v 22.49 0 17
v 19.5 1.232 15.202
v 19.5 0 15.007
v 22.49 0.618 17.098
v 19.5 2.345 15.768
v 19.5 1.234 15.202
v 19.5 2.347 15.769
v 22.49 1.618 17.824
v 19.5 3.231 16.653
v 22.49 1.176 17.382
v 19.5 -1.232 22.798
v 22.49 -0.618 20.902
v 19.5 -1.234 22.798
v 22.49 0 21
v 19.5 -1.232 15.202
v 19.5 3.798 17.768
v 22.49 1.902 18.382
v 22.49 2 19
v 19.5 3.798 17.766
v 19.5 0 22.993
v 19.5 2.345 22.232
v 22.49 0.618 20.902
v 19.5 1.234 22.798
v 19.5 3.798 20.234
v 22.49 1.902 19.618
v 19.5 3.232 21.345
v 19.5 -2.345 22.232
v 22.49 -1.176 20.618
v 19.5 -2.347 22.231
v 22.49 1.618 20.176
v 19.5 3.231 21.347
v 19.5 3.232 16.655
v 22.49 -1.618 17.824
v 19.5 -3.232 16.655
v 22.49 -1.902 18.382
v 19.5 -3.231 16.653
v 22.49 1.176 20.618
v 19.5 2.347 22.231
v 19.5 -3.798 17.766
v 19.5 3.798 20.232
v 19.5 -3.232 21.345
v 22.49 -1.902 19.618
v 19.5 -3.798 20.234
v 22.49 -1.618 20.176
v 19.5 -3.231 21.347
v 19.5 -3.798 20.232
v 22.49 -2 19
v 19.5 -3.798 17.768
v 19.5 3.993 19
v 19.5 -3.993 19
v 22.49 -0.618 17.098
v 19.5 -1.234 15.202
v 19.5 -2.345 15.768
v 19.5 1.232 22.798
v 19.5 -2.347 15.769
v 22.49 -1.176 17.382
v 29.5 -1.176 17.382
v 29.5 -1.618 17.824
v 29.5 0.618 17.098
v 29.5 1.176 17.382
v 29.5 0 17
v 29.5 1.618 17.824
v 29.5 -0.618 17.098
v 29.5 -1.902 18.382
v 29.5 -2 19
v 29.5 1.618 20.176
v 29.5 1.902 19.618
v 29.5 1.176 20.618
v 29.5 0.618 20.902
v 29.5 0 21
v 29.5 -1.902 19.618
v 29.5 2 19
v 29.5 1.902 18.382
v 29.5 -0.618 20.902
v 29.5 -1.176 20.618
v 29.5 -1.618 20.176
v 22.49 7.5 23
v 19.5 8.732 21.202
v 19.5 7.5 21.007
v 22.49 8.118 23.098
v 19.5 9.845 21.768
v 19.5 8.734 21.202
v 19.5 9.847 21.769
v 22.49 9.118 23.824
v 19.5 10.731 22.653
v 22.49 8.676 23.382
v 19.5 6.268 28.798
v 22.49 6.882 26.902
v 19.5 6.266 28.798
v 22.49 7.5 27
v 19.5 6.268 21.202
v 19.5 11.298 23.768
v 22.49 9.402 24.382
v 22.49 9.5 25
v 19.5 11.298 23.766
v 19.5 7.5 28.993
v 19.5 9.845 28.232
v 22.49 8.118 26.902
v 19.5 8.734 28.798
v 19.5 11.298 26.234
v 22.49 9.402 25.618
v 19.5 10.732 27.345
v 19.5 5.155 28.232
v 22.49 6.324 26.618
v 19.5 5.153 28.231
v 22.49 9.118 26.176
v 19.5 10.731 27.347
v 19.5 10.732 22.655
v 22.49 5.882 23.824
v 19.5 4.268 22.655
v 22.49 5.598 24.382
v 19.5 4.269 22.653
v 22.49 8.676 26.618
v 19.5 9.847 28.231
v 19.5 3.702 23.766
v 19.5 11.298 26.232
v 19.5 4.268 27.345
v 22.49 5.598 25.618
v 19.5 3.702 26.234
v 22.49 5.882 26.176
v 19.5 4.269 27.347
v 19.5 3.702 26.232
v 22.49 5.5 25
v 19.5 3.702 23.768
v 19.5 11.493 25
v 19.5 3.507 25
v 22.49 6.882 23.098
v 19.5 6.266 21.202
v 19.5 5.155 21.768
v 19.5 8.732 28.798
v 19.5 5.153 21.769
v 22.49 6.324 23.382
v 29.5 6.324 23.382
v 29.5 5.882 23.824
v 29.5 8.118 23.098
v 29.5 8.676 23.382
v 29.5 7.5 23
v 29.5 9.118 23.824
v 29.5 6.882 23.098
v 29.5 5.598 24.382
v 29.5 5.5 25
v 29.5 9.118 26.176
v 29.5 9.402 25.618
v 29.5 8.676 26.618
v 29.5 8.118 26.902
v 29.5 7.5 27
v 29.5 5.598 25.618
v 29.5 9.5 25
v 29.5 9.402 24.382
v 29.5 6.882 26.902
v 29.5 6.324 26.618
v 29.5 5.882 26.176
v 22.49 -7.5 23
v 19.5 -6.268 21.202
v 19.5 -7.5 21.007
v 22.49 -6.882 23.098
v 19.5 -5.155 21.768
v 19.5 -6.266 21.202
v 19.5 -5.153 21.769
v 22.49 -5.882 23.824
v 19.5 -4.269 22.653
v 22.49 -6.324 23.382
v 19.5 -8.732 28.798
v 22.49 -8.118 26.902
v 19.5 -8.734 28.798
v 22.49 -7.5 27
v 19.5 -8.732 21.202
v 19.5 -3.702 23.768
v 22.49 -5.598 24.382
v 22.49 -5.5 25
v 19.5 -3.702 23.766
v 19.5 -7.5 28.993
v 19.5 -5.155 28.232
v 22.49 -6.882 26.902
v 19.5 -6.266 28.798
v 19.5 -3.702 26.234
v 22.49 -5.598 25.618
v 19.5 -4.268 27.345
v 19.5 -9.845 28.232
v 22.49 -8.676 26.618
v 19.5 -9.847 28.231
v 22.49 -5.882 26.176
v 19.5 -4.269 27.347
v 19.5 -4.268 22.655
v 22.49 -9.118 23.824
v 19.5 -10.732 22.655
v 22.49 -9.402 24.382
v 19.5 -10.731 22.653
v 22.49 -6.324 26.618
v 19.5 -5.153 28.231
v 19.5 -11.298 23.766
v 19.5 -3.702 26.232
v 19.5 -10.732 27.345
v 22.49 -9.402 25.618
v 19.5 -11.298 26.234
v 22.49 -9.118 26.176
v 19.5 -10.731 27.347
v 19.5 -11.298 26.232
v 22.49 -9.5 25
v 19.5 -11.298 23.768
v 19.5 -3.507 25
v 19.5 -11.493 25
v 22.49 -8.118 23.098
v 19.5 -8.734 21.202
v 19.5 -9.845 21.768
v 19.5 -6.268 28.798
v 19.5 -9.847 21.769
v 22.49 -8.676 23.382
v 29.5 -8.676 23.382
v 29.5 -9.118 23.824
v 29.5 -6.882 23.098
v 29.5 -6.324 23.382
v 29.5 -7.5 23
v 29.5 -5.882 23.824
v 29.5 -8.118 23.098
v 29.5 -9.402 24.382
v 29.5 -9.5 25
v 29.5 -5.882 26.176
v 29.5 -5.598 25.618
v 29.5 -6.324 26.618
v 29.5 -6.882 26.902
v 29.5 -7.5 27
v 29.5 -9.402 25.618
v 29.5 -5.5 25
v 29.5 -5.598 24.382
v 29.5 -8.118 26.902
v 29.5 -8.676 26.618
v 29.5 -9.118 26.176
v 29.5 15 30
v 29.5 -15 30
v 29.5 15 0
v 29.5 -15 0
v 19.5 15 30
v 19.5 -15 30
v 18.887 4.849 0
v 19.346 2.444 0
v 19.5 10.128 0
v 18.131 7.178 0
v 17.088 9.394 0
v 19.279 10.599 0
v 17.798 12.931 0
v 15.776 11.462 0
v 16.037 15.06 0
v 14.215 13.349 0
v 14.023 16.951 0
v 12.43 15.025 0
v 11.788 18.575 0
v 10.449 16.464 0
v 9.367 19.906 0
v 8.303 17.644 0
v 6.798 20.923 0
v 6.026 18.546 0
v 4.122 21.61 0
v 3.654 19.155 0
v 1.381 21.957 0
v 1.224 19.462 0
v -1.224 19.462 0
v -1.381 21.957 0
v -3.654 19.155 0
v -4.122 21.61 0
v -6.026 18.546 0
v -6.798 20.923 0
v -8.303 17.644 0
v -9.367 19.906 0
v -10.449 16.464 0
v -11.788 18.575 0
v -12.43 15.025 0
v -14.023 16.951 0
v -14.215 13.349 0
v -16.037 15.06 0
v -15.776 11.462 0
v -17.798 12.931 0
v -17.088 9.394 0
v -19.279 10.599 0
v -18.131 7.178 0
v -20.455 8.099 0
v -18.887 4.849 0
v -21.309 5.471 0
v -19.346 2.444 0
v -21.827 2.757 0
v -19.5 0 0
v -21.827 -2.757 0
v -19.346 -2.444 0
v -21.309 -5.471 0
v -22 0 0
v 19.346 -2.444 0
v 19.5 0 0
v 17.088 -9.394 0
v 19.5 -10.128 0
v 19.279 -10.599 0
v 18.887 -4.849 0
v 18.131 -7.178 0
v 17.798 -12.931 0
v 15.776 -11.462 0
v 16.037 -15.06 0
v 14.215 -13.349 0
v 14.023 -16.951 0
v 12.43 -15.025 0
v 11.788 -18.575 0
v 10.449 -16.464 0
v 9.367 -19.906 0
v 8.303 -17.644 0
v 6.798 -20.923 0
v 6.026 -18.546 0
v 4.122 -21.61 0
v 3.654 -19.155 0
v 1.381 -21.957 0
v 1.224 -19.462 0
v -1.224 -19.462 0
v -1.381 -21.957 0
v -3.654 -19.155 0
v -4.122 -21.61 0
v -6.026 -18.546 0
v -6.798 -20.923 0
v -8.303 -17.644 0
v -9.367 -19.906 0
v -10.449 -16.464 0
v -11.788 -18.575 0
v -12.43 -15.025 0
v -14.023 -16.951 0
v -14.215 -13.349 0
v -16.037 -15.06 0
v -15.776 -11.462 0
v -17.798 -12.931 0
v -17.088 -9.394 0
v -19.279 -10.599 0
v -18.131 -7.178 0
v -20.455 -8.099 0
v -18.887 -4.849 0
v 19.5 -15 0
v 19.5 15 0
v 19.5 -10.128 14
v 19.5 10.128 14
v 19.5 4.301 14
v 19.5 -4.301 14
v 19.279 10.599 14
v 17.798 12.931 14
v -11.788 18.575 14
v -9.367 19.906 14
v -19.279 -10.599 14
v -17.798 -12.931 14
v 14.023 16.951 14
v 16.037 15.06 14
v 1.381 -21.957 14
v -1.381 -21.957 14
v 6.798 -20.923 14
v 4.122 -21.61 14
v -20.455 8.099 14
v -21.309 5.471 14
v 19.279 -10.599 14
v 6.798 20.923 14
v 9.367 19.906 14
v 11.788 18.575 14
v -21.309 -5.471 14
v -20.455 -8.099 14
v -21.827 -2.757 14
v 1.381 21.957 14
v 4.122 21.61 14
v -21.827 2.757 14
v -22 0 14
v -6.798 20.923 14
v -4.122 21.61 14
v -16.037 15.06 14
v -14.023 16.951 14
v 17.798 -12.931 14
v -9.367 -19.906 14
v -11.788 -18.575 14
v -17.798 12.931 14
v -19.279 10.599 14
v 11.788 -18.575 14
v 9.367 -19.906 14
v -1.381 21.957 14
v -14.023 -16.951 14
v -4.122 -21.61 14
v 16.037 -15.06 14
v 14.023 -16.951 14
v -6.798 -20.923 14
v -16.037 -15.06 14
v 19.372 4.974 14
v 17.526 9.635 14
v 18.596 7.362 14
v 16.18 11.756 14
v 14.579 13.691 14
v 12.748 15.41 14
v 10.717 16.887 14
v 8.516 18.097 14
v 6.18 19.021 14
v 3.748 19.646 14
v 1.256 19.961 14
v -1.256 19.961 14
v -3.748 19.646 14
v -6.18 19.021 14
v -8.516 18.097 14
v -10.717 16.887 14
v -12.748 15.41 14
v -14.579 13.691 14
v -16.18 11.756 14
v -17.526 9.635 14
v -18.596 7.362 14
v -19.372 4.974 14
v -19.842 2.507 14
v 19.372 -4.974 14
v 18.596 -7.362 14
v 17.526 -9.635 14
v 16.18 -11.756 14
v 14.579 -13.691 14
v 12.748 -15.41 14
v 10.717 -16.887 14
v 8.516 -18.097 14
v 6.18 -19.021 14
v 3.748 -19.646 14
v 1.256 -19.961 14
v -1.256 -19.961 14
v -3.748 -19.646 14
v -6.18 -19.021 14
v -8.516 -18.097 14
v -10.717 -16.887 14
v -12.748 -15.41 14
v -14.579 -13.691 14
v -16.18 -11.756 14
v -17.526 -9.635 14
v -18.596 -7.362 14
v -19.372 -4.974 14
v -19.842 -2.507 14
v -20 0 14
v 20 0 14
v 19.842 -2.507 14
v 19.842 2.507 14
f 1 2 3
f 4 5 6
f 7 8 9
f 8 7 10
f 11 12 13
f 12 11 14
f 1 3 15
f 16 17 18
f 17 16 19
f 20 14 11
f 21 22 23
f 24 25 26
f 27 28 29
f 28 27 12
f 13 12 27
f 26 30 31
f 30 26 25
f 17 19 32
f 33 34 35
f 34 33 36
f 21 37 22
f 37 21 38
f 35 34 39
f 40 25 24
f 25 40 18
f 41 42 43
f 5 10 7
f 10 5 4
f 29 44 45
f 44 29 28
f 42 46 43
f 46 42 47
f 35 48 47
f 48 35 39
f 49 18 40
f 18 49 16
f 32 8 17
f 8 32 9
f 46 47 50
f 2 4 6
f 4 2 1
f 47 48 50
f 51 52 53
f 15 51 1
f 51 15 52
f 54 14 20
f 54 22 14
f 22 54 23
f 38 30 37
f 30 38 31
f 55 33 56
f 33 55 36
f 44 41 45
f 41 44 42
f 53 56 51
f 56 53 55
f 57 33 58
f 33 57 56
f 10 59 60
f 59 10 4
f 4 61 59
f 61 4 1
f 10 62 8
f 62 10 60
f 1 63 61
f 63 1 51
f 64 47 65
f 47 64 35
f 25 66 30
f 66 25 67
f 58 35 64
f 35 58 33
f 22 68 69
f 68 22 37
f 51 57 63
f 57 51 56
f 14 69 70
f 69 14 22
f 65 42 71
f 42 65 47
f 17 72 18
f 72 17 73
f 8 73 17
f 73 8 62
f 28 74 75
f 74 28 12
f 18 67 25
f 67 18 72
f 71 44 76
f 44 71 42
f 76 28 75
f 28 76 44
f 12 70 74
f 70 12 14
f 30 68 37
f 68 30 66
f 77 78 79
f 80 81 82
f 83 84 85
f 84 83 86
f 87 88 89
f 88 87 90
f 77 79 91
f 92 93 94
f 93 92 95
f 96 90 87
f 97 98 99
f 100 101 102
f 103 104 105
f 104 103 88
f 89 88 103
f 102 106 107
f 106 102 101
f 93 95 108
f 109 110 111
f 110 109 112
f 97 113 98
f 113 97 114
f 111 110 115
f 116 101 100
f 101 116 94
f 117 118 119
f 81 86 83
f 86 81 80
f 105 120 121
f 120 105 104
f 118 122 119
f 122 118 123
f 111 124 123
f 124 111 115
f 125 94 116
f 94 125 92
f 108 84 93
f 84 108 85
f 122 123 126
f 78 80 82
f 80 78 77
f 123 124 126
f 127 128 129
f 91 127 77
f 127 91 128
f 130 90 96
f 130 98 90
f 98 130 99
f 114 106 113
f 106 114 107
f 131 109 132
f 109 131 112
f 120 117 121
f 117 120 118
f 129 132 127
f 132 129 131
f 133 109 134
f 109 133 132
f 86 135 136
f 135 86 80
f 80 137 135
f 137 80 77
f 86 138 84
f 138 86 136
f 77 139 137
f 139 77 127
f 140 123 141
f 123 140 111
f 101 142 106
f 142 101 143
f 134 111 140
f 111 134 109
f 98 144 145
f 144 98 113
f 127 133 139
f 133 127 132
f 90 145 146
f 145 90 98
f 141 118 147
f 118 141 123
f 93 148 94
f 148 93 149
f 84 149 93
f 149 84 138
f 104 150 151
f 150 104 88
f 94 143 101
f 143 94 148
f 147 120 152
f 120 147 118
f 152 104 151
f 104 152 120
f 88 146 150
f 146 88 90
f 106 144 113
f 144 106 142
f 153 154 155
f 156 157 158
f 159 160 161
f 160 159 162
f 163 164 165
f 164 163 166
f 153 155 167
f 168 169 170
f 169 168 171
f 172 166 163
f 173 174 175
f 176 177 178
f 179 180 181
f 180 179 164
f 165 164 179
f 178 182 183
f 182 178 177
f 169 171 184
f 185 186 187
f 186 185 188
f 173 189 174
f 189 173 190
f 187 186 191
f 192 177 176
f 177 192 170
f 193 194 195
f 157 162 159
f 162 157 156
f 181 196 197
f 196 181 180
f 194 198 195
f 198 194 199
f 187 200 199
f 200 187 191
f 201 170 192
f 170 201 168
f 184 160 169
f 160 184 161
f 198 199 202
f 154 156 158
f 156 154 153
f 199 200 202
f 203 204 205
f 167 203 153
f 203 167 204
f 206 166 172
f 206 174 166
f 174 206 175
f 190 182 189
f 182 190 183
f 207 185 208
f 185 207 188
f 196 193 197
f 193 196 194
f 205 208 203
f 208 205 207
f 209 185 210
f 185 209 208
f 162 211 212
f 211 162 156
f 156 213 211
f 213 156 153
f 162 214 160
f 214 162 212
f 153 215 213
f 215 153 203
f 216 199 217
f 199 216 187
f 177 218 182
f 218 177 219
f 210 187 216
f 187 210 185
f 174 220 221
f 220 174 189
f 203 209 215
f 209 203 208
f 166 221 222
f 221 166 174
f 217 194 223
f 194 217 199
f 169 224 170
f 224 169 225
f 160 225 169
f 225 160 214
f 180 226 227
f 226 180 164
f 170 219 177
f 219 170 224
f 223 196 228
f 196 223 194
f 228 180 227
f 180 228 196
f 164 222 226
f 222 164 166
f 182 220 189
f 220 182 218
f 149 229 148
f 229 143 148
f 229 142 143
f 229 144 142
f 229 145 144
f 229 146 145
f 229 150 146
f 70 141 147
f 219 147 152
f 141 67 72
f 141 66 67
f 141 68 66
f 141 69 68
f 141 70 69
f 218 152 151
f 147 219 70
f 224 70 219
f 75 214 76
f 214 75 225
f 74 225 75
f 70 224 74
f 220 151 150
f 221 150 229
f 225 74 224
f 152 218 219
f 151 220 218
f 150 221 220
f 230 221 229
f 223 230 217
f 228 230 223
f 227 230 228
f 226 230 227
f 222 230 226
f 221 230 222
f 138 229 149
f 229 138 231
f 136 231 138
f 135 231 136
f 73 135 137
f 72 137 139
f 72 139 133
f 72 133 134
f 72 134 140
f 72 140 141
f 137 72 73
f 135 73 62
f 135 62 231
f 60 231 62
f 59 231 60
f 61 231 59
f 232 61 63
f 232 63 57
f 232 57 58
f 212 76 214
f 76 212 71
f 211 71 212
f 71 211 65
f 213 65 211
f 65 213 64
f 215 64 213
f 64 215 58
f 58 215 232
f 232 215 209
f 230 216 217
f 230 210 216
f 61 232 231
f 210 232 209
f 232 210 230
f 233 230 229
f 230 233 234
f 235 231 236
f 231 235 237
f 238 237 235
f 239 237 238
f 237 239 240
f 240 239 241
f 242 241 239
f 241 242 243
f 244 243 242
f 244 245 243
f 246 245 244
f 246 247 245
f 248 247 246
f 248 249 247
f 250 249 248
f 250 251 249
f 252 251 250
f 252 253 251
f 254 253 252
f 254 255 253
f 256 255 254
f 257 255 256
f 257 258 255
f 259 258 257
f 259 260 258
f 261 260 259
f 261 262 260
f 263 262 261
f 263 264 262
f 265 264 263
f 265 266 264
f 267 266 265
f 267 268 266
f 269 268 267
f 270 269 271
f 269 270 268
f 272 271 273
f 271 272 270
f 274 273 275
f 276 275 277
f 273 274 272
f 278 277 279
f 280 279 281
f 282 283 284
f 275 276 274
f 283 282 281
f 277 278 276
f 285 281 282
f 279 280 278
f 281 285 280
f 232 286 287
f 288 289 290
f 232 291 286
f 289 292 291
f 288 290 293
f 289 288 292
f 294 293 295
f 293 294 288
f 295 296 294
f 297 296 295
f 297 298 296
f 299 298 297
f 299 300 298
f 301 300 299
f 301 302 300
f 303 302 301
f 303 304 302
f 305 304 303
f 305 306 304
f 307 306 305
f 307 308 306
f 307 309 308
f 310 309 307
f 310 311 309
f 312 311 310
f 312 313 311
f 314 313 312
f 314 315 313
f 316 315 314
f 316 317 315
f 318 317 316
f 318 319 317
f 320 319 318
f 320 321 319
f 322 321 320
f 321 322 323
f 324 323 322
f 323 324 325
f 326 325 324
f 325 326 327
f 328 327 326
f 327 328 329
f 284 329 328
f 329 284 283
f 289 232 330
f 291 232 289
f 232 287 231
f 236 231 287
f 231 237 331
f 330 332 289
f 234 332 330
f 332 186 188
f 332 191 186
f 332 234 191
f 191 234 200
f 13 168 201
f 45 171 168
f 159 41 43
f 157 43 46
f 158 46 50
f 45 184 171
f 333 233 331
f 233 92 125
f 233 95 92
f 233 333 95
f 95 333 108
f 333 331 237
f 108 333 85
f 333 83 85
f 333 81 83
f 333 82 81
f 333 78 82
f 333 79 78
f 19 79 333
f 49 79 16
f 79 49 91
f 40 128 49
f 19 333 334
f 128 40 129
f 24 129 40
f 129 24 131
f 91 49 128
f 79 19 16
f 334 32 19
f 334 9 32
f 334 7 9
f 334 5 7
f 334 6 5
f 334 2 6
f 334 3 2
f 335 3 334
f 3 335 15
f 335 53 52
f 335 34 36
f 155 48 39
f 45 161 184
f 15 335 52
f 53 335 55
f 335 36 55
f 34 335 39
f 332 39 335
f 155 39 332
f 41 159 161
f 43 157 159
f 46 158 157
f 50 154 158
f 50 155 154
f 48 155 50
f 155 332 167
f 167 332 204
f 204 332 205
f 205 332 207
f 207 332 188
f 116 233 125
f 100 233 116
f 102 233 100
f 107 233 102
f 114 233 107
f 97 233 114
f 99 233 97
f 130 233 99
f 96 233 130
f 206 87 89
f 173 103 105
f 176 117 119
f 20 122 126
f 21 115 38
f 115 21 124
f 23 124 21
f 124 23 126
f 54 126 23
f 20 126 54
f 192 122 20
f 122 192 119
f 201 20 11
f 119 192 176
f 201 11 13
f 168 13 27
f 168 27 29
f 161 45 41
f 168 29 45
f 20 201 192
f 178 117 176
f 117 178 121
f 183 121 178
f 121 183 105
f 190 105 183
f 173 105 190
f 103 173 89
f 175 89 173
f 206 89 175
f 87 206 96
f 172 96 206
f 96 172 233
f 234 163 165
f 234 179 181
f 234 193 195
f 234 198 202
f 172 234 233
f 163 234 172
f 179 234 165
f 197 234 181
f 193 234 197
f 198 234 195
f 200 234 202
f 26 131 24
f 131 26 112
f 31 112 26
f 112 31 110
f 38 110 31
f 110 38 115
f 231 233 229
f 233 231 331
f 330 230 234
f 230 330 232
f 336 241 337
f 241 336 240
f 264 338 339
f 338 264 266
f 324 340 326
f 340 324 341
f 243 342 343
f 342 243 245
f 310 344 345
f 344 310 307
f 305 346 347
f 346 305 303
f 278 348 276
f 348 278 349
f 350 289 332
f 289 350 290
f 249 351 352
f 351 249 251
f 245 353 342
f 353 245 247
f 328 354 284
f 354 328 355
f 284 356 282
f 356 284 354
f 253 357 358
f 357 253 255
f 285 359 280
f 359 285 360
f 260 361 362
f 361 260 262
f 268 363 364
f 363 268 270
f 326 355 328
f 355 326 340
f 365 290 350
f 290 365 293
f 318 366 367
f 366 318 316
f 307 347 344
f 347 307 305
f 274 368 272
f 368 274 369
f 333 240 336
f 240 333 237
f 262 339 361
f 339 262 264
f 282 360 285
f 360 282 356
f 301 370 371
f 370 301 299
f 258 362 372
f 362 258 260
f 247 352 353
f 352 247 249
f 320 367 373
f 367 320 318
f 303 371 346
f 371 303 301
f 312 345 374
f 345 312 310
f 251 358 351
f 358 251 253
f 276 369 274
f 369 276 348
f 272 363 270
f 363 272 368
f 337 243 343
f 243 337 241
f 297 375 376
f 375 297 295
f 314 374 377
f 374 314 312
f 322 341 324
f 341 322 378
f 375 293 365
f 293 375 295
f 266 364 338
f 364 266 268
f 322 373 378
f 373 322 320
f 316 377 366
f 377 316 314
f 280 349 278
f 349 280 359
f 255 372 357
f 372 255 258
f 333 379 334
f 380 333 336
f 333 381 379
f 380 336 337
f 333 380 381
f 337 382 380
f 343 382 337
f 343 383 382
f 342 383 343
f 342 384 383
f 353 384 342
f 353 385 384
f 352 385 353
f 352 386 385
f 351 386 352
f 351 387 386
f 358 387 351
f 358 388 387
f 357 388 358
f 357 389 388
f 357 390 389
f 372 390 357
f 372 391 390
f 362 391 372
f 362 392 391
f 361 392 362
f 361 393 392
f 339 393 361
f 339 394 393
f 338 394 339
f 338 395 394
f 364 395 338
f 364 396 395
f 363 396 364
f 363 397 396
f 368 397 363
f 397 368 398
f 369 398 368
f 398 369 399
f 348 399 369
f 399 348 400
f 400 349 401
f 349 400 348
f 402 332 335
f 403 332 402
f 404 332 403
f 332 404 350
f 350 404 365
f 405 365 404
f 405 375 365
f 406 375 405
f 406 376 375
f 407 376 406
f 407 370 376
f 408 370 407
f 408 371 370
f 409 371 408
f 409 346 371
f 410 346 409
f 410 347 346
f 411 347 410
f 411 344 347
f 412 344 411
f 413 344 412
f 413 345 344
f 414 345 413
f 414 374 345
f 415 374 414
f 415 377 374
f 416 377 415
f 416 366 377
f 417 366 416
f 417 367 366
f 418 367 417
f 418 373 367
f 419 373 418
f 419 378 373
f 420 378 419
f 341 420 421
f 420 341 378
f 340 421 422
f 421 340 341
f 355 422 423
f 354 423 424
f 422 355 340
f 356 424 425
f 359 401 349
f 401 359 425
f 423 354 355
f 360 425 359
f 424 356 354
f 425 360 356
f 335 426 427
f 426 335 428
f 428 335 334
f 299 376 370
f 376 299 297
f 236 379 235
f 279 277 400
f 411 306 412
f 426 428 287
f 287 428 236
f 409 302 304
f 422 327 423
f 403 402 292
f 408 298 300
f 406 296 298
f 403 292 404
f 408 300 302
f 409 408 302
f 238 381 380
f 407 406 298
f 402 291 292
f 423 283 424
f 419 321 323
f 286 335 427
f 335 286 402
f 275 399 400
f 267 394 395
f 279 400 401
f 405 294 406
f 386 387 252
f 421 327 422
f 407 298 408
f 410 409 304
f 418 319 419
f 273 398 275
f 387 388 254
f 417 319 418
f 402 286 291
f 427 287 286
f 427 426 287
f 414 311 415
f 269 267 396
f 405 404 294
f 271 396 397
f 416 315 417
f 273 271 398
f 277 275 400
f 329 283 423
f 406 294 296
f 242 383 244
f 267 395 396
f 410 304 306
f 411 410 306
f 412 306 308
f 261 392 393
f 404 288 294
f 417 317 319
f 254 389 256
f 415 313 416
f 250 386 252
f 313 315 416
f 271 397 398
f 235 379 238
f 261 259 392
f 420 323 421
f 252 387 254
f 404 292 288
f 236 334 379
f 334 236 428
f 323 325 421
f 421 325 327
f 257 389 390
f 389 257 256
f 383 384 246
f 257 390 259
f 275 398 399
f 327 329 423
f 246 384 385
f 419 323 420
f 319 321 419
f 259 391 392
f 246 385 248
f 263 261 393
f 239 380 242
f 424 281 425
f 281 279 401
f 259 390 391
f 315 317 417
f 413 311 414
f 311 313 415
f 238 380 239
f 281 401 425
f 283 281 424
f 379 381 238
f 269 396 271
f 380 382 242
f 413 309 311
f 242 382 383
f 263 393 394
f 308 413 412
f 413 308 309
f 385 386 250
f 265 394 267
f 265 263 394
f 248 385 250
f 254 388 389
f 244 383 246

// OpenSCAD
// Cup holder
$fn = 50;
cup_d1 = 39;
cup_d2 = 40;
cup_h = 14;
cup_w = 5;

mount_x = 10;
mount_y = 30;
mount_z = 30;
mount_x_offset = 5;

module screw_countersunk(
        l=20,   //length
        dh = 8,   //head dia
        lh = 3,   //head length
        ds = 4,  //shaft dia
        $fn=20,
        )
{
    union() {
        cylinder(h=lh, r1=dh/2, r2=ds/2);
        cylinder(h=l, d=ds);
    }
}

module outer_cup_mount() {
  outer_d = cup_d1 + cup_w;
  cylinder(d=outer_d, h=cup_h);
    
}

module inner_cup_mount() {
    cylinder(d1=cup_d1, d2=cup_d2, h=cup_h);
}
    
module wall_mount() {
    difference() {
    cube([mount_x, mount_y, mount_z], center=true);
    translate([-0.5*mount_x-0.01, 0, -0.5*mount_z + cup_h + 5]) rotate([0, 90, 0]) screw_countersunk();
    translate([-0.5*mount_x-0.01, 0.25*mount_y, 0.5*mount_z - 5]) rotate([0, 90, 0]) screw_countersunk();
    translate([-0.5*mount_x-0.01, -0.25*mount_y, 0.5*mount_z - 5]) rotate([0, 90, 0]) screw_countersunk();
    }
    translate([-0.5*mount_x_offset, 0, -0.5*(mount_z-cup_h)]) cube([mount_x_offset, mount_y, cup_h], center=true);
}

module solid_mount() {
outer_cup_mount();
translate([0.5*cup_d1 + mount_x_offset, 0, 0.5*mount_z]) wall_mount();
}

difference() {
    solid_mount();
    inner_cup_mount();
}
